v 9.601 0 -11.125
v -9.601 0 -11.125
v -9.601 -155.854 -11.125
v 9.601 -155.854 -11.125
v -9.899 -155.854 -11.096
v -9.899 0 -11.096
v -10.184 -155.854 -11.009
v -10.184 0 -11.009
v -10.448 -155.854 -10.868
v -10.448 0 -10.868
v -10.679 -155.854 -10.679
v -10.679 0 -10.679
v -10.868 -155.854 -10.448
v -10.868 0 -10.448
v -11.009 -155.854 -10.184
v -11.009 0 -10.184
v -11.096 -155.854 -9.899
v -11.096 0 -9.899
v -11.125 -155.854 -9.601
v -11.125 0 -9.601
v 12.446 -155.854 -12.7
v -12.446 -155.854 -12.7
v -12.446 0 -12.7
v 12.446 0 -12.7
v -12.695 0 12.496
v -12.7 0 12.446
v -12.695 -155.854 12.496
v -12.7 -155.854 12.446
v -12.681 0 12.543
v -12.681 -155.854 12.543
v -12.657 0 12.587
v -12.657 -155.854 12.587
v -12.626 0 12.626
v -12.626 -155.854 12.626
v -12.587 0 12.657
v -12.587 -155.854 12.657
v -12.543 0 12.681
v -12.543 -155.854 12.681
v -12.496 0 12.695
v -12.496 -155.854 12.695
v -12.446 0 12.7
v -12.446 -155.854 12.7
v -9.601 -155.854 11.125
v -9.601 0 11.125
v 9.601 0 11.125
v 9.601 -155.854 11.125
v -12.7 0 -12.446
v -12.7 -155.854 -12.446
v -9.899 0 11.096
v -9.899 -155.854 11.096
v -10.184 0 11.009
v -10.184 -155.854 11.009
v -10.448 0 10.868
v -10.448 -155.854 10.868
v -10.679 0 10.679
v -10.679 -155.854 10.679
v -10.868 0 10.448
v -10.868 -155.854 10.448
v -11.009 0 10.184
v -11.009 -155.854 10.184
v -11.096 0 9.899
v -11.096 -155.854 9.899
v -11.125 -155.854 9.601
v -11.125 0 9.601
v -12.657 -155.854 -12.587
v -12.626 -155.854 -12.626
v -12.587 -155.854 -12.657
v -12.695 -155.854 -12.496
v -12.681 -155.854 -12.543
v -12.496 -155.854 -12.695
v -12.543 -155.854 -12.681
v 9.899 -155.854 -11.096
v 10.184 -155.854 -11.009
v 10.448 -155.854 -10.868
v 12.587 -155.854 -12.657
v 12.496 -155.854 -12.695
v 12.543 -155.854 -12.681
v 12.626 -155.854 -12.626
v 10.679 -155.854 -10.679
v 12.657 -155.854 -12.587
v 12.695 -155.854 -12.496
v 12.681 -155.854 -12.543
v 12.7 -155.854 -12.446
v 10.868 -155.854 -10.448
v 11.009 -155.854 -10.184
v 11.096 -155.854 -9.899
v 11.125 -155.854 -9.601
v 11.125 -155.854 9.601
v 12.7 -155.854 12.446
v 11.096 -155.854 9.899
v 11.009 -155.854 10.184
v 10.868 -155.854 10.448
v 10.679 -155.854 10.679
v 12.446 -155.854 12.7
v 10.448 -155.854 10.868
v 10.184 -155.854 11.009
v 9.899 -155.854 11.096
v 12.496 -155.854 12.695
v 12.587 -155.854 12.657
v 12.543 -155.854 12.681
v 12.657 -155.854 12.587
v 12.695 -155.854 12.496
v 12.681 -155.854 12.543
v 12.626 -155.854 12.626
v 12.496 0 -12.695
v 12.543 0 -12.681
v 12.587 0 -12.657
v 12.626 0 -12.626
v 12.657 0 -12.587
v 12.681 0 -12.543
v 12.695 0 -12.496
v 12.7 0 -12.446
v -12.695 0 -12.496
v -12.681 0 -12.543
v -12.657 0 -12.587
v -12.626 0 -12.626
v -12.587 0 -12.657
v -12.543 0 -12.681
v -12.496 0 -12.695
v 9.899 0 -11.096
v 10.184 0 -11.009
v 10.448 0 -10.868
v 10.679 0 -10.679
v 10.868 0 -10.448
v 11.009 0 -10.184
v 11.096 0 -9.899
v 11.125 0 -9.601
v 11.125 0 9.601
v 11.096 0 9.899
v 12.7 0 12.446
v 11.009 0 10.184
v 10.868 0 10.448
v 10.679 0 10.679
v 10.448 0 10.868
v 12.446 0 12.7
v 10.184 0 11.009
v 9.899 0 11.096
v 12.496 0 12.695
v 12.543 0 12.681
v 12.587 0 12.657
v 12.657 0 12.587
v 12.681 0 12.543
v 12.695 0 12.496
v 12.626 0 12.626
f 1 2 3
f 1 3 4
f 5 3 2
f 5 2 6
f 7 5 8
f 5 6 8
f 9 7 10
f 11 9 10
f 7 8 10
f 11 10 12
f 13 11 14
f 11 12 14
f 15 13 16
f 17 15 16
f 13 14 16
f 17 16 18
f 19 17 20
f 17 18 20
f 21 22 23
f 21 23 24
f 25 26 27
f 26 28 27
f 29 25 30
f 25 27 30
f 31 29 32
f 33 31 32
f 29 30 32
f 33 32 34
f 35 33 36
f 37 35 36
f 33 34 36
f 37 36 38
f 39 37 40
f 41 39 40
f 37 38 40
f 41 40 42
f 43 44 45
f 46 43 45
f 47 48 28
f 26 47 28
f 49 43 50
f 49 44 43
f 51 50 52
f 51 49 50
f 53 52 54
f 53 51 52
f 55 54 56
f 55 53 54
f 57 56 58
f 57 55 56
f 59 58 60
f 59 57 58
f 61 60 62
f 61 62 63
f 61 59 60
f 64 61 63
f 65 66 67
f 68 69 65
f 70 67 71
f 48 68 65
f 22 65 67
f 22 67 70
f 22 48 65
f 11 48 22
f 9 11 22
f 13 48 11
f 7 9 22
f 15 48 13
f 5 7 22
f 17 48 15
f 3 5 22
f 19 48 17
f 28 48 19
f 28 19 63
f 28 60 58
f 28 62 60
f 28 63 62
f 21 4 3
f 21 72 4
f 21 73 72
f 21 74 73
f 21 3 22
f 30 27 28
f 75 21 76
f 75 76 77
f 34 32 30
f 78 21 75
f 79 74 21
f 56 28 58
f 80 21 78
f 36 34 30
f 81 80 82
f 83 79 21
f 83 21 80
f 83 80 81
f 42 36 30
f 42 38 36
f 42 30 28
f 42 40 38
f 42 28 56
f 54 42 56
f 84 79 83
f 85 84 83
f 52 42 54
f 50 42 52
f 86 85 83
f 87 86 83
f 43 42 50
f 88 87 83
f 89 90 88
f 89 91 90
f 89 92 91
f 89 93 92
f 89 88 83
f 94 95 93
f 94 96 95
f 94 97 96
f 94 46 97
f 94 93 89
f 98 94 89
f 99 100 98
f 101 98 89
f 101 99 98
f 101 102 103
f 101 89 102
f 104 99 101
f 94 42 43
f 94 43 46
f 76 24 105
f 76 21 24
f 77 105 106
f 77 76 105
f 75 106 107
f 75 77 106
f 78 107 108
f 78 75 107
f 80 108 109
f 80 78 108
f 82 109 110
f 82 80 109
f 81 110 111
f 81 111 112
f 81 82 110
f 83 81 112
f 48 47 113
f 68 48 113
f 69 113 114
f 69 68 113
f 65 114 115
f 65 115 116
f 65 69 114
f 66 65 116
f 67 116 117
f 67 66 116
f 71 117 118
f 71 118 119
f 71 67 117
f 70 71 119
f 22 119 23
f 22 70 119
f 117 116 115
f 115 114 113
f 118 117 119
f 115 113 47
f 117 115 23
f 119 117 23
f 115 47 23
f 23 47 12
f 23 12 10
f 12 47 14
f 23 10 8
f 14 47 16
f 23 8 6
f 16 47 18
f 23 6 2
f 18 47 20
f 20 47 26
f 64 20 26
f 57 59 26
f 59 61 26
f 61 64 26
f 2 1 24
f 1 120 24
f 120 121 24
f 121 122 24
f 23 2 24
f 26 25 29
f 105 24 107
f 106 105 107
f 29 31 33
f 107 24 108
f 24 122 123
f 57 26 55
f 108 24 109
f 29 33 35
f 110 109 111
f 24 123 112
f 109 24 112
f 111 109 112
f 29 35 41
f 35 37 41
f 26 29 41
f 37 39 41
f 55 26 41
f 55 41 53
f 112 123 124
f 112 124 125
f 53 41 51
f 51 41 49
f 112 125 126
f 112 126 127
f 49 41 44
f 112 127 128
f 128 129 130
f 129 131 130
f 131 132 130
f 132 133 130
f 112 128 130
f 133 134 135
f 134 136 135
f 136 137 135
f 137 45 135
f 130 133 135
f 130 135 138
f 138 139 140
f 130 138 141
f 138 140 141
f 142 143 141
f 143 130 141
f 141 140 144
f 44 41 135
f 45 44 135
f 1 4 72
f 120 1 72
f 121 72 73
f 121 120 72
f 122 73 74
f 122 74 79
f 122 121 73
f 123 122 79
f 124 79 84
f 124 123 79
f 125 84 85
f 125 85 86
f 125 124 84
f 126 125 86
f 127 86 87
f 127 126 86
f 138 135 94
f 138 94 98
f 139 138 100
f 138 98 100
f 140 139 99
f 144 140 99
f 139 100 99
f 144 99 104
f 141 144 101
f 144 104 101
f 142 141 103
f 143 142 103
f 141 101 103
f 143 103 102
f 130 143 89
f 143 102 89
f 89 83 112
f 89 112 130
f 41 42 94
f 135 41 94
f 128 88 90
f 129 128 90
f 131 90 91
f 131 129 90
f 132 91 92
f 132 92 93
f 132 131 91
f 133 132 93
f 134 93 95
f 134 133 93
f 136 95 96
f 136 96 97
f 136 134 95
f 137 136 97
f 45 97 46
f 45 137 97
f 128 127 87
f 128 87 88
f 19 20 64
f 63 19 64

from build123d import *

# Parameters (mm, degrees)
F0_W     = 25.4
F0_H     = 25.4
F1_DEPTH = 155.8544
F2_W     = 22.2504
F2_H     = 22.2504
F3_DEPTH = 155.8544
F4_R     = 1.524
F5_R     = 0.254


with BuildPart() as f1:
    # F0 (on Front) → F1 (new body)
    with BuildSketch(Plane.XZ):
        Rectangle(F0_W, F0_H)
    extrude(amount=F1_DEPTH)

    # F2 (on face) → F3 (cut, through all)
    with BuildSketch(Plane.XZ.offset(155.8544)):
        Rectangle(F2_W, F2_H)
    extrude(amount=-F3_DEPTH, mode=Mode.SUBTRACT)

    # F4
    f4_edges = [f1.edges().sort_by_distance(p)[0] for p in [
        (-11.1252, -77.9272, 11.1252),
        (11.1252, -77.9272, -11.1252),
        (11.1252, -77.9272, 11.1252),
        (-11.1252, -77.9272, -11.1252),
    ]]
    fillet(f4_edges, radius=F4_R)

    # F5
    f5_edges = [f1.edges().sort_by_distance(p)[0] for p in [
        (12.7, -77.9272, 12.7),
        (12.7, -77.9272, -12.7),
        (-12.7, -77.9272, -12.7),
        (-12.7, -77.9272, 12.7),
    ]]
    fillet(f5_edges, radius=F5_R)


solid = f1.part
